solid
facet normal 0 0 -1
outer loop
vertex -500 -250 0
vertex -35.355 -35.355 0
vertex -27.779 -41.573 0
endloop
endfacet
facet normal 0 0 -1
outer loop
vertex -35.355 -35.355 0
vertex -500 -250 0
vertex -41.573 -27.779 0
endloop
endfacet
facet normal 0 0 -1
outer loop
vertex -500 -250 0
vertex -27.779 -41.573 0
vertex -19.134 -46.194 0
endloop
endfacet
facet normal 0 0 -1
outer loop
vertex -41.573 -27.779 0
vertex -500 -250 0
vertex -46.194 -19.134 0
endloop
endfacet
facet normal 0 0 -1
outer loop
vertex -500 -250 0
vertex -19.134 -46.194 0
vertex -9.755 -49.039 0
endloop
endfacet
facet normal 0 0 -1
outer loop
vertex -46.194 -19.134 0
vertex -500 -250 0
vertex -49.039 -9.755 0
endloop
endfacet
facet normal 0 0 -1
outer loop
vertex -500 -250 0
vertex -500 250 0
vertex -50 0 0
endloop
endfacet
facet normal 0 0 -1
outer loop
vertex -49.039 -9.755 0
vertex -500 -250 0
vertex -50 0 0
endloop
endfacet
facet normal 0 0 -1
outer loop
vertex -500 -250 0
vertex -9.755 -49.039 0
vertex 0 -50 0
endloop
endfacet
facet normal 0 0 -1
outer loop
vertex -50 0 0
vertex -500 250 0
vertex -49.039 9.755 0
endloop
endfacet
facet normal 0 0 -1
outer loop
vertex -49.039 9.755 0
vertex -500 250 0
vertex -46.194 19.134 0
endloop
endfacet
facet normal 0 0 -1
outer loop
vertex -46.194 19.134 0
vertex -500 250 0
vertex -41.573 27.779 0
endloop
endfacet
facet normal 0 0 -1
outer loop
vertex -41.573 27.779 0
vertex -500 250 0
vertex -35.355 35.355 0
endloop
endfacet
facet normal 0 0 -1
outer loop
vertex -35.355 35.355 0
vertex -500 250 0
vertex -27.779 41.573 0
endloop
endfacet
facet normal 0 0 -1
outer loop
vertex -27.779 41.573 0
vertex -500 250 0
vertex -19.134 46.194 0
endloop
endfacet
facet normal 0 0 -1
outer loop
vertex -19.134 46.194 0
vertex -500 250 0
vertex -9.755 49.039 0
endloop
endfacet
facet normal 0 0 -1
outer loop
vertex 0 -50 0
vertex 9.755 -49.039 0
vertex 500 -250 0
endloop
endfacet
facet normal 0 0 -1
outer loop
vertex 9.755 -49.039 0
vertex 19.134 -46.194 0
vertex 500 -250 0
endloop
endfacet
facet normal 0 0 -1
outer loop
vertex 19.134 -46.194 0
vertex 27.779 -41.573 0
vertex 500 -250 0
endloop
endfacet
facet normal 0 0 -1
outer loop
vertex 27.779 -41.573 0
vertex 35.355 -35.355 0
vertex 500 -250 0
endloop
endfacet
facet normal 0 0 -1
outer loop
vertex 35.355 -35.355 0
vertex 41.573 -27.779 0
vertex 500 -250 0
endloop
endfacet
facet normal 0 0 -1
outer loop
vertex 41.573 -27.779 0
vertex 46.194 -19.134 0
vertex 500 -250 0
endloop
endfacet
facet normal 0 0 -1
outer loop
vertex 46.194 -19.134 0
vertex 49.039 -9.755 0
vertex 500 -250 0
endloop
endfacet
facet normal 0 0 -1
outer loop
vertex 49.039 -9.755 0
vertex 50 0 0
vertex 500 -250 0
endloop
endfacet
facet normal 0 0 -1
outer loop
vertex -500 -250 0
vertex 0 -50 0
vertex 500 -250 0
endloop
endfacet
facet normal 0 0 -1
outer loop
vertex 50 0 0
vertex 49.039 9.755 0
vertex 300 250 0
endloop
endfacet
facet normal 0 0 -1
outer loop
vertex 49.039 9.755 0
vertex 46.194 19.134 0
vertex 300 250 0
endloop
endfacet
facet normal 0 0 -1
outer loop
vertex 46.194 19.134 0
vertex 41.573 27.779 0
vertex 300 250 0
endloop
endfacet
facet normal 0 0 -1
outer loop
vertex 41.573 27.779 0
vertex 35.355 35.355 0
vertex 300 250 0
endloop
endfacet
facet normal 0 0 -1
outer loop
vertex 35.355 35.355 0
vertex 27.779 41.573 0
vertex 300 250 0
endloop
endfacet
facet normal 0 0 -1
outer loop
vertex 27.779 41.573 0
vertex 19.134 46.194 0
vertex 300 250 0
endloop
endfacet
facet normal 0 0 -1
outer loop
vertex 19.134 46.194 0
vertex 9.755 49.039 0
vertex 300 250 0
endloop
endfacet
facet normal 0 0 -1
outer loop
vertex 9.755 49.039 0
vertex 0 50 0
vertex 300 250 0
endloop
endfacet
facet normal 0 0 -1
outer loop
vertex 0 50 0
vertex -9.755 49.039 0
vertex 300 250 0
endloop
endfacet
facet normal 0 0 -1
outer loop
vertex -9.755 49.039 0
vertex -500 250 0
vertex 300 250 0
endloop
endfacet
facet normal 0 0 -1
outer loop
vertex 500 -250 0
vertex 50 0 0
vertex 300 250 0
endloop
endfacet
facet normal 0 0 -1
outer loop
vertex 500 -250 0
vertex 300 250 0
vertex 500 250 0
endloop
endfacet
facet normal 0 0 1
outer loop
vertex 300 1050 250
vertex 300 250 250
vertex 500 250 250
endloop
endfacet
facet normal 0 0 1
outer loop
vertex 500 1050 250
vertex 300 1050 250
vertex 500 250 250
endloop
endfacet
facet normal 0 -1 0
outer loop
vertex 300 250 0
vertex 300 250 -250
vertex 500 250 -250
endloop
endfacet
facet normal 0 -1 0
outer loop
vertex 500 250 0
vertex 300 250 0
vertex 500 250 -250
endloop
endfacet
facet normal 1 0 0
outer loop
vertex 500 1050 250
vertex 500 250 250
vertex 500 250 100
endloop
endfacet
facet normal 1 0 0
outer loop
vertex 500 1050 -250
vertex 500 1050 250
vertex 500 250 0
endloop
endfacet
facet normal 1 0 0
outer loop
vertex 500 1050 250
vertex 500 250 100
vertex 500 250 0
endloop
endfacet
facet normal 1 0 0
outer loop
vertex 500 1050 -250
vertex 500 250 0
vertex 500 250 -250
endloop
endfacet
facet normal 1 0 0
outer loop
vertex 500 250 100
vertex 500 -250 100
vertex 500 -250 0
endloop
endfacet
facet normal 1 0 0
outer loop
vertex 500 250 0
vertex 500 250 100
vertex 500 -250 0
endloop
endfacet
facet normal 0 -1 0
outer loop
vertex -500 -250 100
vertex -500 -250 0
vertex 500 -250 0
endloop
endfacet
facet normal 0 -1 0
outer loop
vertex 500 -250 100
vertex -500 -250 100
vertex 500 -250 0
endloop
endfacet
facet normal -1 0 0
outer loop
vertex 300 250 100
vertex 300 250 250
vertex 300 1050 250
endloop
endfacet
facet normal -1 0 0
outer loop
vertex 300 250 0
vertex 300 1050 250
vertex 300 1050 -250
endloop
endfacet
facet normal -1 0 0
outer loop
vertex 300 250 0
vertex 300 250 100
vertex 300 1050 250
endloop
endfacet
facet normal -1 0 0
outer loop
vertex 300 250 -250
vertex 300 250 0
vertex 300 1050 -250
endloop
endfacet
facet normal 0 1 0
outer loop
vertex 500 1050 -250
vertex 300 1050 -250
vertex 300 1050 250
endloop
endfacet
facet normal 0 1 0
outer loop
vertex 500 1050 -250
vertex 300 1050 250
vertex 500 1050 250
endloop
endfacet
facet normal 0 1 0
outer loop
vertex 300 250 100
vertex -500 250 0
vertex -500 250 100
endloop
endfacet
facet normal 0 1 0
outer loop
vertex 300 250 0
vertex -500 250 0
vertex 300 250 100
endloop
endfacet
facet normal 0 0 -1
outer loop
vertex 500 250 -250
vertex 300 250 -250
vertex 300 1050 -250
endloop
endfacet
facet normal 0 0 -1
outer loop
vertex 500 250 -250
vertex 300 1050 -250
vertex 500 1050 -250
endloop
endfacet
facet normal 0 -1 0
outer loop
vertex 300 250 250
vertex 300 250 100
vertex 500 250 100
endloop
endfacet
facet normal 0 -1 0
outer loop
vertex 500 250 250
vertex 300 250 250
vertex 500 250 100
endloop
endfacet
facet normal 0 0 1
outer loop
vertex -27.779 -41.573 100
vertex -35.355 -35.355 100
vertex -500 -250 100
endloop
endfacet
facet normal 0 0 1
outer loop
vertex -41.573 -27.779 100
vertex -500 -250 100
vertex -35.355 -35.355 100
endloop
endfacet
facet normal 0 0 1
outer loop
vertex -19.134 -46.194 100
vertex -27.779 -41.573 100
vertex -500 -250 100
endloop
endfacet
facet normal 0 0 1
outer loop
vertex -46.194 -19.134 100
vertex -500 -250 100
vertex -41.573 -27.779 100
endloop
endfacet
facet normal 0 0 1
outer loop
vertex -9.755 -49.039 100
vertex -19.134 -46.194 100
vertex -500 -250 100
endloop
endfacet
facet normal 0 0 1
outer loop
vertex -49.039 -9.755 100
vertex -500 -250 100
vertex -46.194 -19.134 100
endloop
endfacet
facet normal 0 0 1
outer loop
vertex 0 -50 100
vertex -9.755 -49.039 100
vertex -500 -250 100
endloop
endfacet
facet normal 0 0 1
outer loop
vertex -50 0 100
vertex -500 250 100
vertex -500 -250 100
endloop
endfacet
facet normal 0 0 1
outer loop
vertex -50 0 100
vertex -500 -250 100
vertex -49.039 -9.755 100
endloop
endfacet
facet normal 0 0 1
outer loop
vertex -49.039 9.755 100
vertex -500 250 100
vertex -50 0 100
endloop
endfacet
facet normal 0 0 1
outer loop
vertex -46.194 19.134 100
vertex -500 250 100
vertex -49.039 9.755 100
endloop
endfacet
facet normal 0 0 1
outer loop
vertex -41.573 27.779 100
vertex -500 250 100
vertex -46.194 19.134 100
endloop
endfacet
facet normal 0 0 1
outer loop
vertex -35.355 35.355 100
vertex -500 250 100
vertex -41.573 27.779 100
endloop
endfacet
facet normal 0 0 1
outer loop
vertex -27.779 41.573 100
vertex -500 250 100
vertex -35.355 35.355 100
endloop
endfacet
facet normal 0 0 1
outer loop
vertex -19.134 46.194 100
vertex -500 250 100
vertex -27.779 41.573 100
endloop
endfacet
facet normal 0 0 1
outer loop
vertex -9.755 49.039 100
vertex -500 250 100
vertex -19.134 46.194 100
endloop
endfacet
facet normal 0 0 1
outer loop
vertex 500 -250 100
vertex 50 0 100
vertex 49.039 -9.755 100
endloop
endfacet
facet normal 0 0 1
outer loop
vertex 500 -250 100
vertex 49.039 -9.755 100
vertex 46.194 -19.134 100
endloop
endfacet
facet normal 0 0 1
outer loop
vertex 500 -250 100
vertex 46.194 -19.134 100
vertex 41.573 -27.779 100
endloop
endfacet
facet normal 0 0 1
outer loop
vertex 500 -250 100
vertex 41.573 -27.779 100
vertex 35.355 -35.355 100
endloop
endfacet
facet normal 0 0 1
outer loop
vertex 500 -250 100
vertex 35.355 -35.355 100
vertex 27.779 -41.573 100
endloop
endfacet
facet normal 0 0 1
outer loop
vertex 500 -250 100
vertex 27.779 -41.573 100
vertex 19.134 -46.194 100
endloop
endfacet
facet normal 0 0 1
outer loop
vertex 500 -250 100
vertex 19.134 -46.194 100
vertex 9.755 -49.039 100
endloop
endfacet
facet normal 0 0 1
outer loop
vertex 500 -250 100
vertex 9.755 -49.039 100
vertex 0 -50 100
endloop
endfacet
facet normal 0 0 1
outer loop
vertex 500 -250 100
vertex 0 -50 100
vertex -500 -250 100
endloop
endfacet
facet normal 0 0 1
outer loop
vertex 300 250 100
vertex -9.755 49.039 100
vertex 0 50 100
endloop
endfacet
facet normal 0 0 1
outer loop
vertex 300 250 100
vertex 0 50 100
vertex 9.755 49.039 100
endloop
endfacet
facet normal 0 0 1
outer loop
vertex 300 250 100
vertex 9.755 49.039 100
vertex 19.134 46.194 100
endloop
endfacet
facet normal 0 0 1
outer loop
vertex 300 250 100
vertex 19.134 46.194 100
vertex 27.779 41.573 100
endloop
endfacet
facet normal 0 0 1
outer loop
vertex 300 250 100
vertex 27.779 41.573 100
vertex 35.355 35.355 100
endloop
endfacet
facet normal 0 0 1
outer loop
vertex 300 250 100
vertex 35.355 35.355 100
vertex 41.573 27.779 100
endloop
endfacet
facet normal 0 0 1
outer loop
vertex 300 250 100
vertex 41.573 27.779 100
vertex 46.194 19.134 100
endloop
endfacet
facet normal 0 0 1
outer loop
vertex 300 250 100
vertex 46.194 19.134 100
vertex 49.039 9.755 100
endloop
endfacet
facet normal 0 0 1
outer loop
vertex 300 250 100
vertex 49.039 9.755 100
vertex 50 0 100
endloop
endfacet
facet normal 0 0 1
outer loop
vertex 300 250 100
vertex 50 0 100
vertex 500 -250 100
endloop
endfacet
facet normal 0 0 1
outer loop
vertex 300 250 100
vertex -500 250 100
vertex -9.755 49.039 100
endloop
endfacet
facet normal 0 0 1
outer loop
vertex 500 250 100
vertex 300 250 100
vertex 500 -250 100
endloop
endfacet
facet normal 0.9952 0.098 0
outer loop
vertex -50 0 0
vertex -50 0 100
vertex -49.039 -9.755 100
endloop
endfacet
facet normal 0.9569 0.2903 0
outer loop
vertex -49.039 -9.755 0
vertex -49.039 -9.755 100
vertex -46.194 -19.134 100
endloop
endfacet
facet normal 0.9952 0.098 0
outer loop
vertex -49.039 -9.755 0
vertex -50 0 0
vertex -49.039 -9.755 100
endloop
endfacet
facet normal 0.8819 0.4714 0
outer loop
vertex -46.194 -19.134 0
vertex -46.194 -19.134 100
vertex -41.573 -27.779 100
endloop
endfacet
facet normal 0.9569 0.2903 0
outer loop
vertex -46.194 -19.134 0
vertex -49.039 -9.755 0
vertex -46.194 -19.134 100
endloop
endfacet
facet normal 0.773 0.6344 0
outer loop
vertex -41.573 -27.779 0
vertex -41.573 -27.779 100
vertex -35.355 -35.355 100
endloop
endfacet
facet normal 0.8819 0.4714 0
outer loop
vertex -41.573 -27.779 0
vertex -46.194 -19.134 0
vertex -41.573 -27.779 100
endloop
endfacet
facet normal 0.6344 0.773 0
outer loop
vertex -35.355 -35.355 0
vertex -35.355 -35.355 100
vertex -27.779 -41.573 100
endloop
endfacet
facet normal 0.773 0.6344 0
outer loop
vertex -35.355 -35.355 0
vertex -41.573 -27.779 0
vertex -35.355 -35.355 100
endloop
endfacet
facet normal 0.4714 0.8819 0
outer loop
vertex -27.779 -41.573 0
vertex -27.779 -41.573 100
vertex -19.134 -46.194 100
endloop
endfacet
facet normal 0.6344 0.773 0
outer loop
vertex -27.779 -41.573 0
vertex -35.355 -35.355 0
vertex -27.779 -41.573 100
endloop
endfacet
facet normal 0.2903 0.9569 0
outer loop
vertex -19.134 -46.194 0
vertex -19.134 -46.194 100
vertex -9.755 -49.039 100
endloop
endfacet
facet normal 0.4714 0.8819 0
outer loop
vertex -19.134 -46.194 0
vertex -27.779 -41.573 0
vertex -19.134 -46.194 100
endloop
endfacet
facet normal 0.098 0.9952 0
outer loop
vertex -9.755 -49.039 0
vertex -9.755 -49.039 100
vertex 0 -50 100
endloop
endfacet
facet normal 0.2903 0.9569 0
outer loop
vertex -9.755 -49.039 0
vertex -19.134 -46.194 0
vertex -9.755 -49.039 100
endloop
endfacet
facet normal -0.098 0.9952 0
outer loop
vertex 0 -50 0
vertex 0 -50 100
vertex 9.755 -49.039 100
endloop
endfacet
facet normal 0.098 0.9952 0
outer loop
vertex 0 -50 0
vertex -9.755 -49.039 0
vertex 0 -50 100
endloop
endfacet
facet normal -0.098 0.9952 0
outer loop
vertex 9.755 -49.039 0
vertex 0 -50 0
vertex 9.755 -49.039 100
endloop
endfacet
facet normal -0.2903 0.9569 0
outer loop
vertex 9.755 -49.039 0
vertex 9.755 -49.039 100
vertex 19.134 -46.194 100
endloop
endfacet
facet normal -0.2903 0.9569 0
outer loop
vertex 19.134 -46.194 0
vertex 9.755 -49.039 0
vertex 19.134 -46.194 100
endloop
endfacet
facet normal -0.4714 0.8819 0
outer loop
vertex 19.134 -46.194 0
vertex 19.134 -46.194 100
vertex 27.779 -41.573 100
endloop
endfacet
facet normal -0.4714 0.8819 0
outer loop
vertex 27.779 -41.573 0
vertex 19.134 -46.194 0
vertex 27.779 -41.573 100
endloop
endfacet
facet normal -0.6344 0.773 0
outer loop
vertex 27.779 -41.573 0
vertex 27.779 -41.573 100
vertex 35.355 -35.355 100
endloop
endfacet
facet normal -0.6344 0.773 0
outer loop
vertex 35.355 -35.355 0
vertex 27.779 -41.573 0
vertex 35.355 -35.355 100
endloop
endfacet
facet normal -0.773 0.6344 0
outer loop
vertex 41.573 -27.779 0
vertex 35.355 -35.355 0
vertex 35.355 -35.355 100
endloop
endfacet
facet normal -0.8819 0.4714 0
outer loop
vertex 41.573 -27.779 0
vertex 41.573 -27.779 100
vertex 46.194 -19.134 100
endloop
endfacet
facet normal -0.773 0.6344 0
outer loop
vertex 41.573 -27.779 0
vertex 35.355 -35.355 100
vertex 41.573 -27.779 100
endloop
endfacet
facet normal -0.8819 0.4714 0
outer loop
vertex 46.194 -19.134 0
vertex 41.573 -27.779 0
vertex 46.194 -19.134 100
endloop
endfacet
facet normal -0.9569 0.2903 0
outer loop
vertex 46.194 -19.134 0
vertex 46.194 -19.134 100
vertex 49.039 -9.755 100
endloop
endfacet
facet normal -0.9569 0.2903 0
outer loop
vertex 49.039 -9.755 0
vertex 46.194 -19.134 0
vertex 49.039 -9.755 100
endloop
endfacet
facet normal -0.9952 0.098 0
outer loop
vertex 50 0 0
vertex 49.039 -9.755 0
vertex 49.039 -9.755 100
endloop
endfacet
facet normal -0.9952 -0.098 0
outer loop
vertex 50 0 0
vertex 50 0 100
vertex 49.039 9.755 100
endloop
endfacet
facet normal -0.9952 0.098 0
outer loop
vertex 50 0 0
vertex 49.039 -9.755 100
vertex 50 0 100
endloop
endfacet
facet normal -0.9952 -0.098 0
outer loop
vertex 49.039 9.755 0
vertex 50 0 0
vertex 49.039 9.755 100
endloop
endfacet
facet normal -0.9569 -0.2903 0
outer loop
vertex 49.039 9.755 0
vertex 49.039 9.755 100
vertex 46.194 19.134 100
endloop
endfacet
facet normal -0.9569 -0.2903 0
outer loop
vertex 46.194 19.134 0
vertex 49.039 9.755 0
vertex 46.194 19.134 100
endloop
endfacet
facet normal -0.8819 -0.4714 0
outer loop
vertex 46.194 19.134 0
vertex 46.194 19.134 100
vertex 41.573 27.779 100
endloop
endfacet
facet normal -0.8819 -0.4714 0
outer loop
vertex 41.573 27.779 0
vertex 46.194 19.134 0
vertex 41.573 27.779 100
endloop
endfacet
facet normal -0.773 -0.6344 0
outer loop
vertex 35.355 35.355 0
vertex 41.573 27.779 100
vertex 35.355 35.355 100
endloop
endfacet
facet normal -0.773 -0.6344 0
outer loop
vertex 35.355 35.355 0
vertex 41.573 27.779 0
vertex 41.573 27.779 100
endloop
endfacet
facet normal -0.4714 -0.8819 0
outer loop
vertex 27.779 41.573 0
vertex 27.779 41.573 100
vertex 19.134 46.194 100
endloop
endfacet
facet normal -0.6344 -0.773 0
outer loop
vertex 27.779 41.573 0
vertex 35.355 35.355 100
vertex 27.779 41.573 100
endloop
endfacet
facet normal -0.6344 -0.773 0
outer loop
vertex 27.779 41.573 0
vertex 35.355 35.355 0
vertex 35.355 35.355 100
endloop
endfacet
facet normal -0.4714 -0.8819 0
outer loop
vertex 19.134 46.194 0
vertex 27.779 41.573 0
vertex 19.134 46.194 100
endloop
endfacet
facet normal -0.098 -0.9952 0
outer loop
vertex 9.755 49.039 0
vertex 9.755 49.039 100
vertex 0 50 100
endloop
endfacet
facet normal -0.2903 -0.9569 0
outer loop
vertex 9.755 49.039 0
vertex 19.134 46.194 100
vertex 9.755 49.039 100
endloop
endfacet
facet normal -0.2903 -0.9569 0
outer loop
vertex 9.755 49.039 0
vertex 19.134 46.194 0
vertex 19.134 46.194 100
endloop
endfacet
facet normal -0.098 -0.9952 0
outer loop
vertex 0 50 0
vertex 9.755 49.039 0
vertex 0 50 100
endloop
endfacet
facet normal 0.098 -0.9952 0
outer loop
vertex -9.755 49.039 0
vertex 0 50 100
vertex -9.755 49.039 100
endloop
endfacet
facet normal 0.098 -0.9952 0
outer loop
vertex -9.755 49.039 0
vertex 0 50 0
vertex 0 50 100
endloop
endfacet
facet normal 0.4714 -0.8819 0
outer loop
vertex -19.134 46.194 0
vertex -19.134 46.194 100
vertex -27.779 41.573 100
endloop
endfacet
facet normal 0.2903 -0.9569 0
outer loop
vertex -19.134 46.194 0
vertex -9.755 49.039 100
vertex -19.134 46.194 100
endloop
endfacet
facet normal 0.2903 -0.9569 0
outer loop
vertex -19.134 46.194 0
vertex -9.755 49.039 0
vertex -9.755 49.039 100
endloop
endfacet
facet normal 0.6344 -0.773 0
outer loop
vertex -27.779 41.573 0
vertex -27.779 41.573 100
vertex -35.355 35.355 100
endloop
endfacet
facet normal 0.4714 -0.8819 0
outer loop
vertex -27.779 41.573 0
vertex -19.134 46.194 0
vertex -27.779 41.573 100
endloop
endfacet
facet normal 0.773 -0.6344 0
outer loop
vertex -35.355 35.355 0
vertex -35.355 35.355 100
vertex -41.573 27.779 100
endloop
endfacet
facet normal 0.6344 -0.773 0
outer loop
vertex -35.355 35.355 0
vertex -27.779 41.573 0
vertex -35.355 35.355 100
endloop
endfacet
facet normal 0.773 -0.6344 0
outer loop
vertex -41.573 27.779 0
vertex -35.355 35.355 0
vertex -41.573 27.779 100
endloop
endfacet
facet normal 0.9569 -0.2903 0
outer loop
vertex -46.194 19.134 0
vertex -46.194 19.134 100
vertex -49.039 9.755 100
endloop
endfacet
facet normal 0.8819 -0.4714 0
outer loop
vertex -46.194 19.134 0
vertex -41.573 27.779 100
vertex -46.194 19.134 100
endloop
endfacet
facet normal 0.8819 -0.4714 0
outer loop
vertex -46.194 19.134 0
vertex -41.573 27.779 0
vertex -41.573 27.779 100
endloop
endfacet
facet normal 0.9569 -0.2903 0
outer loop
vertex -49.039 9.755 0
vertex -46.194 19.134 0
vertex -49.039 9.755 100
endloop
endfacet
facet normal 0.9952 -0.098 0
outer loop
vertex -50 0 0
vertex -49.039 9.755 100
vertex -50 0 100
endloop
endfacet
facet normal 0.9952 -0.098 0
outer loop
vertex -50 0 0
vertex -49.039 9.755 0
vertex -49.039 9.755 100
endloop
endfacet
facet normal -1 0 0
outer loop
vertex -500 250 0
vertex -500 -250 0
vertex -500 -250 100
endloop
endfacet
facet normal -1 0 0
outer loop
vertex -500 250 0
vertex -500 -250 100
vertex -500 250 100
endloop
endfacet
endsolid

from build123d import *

# Parameters (mm, degrees)
SKETCH_1_W          = 1000
SKETCH_1_H          = 500
EXTRUDE_1_DEPTH     = 100
SKETCH_2_W          = 200
SKETCH_2_H          = 500
EXTRUDE_2_DEPTH     = 800
SKETCH_3_R          = 50
CUT_EXTRUDE_1_DEPTH = 1190.537725337


with BuildPart() as part:
    # 草图1 → 凸台-拉伸1 (new body)
    with BuildSketch(Plane.XY):
        Rectangle(SKETCH_1_W, SKETCH_1_H)
    extrude(amount=EXTRUDE_1_DEPTH)

    # 草图2 → 凸台-拉伸2 (add)
    with BuildSketch(Plane(origin=(0, 250, 0), x_dir=(1, 0, 0), z_dir=(0, 1, 0))):
        with Locations((400, 0)):
            Rectangle(SKETCH_2_W, SKETCH_2_H)
    extrude(amount=EXTRUDE_2_DEPTH)

    # 草图3 → 切除-拉伸1 (cut, through all)
    with BuildSketch(Plane.XY):
        with Locations(Location((0, 0, 0), (0, 0, 180))):
            Circle(SKETCH_3_R)
    extrude(amount=CUT_EXTRUDE_1_DEPTH, mode=Mode.SUBTRACT)


solid = part.part
